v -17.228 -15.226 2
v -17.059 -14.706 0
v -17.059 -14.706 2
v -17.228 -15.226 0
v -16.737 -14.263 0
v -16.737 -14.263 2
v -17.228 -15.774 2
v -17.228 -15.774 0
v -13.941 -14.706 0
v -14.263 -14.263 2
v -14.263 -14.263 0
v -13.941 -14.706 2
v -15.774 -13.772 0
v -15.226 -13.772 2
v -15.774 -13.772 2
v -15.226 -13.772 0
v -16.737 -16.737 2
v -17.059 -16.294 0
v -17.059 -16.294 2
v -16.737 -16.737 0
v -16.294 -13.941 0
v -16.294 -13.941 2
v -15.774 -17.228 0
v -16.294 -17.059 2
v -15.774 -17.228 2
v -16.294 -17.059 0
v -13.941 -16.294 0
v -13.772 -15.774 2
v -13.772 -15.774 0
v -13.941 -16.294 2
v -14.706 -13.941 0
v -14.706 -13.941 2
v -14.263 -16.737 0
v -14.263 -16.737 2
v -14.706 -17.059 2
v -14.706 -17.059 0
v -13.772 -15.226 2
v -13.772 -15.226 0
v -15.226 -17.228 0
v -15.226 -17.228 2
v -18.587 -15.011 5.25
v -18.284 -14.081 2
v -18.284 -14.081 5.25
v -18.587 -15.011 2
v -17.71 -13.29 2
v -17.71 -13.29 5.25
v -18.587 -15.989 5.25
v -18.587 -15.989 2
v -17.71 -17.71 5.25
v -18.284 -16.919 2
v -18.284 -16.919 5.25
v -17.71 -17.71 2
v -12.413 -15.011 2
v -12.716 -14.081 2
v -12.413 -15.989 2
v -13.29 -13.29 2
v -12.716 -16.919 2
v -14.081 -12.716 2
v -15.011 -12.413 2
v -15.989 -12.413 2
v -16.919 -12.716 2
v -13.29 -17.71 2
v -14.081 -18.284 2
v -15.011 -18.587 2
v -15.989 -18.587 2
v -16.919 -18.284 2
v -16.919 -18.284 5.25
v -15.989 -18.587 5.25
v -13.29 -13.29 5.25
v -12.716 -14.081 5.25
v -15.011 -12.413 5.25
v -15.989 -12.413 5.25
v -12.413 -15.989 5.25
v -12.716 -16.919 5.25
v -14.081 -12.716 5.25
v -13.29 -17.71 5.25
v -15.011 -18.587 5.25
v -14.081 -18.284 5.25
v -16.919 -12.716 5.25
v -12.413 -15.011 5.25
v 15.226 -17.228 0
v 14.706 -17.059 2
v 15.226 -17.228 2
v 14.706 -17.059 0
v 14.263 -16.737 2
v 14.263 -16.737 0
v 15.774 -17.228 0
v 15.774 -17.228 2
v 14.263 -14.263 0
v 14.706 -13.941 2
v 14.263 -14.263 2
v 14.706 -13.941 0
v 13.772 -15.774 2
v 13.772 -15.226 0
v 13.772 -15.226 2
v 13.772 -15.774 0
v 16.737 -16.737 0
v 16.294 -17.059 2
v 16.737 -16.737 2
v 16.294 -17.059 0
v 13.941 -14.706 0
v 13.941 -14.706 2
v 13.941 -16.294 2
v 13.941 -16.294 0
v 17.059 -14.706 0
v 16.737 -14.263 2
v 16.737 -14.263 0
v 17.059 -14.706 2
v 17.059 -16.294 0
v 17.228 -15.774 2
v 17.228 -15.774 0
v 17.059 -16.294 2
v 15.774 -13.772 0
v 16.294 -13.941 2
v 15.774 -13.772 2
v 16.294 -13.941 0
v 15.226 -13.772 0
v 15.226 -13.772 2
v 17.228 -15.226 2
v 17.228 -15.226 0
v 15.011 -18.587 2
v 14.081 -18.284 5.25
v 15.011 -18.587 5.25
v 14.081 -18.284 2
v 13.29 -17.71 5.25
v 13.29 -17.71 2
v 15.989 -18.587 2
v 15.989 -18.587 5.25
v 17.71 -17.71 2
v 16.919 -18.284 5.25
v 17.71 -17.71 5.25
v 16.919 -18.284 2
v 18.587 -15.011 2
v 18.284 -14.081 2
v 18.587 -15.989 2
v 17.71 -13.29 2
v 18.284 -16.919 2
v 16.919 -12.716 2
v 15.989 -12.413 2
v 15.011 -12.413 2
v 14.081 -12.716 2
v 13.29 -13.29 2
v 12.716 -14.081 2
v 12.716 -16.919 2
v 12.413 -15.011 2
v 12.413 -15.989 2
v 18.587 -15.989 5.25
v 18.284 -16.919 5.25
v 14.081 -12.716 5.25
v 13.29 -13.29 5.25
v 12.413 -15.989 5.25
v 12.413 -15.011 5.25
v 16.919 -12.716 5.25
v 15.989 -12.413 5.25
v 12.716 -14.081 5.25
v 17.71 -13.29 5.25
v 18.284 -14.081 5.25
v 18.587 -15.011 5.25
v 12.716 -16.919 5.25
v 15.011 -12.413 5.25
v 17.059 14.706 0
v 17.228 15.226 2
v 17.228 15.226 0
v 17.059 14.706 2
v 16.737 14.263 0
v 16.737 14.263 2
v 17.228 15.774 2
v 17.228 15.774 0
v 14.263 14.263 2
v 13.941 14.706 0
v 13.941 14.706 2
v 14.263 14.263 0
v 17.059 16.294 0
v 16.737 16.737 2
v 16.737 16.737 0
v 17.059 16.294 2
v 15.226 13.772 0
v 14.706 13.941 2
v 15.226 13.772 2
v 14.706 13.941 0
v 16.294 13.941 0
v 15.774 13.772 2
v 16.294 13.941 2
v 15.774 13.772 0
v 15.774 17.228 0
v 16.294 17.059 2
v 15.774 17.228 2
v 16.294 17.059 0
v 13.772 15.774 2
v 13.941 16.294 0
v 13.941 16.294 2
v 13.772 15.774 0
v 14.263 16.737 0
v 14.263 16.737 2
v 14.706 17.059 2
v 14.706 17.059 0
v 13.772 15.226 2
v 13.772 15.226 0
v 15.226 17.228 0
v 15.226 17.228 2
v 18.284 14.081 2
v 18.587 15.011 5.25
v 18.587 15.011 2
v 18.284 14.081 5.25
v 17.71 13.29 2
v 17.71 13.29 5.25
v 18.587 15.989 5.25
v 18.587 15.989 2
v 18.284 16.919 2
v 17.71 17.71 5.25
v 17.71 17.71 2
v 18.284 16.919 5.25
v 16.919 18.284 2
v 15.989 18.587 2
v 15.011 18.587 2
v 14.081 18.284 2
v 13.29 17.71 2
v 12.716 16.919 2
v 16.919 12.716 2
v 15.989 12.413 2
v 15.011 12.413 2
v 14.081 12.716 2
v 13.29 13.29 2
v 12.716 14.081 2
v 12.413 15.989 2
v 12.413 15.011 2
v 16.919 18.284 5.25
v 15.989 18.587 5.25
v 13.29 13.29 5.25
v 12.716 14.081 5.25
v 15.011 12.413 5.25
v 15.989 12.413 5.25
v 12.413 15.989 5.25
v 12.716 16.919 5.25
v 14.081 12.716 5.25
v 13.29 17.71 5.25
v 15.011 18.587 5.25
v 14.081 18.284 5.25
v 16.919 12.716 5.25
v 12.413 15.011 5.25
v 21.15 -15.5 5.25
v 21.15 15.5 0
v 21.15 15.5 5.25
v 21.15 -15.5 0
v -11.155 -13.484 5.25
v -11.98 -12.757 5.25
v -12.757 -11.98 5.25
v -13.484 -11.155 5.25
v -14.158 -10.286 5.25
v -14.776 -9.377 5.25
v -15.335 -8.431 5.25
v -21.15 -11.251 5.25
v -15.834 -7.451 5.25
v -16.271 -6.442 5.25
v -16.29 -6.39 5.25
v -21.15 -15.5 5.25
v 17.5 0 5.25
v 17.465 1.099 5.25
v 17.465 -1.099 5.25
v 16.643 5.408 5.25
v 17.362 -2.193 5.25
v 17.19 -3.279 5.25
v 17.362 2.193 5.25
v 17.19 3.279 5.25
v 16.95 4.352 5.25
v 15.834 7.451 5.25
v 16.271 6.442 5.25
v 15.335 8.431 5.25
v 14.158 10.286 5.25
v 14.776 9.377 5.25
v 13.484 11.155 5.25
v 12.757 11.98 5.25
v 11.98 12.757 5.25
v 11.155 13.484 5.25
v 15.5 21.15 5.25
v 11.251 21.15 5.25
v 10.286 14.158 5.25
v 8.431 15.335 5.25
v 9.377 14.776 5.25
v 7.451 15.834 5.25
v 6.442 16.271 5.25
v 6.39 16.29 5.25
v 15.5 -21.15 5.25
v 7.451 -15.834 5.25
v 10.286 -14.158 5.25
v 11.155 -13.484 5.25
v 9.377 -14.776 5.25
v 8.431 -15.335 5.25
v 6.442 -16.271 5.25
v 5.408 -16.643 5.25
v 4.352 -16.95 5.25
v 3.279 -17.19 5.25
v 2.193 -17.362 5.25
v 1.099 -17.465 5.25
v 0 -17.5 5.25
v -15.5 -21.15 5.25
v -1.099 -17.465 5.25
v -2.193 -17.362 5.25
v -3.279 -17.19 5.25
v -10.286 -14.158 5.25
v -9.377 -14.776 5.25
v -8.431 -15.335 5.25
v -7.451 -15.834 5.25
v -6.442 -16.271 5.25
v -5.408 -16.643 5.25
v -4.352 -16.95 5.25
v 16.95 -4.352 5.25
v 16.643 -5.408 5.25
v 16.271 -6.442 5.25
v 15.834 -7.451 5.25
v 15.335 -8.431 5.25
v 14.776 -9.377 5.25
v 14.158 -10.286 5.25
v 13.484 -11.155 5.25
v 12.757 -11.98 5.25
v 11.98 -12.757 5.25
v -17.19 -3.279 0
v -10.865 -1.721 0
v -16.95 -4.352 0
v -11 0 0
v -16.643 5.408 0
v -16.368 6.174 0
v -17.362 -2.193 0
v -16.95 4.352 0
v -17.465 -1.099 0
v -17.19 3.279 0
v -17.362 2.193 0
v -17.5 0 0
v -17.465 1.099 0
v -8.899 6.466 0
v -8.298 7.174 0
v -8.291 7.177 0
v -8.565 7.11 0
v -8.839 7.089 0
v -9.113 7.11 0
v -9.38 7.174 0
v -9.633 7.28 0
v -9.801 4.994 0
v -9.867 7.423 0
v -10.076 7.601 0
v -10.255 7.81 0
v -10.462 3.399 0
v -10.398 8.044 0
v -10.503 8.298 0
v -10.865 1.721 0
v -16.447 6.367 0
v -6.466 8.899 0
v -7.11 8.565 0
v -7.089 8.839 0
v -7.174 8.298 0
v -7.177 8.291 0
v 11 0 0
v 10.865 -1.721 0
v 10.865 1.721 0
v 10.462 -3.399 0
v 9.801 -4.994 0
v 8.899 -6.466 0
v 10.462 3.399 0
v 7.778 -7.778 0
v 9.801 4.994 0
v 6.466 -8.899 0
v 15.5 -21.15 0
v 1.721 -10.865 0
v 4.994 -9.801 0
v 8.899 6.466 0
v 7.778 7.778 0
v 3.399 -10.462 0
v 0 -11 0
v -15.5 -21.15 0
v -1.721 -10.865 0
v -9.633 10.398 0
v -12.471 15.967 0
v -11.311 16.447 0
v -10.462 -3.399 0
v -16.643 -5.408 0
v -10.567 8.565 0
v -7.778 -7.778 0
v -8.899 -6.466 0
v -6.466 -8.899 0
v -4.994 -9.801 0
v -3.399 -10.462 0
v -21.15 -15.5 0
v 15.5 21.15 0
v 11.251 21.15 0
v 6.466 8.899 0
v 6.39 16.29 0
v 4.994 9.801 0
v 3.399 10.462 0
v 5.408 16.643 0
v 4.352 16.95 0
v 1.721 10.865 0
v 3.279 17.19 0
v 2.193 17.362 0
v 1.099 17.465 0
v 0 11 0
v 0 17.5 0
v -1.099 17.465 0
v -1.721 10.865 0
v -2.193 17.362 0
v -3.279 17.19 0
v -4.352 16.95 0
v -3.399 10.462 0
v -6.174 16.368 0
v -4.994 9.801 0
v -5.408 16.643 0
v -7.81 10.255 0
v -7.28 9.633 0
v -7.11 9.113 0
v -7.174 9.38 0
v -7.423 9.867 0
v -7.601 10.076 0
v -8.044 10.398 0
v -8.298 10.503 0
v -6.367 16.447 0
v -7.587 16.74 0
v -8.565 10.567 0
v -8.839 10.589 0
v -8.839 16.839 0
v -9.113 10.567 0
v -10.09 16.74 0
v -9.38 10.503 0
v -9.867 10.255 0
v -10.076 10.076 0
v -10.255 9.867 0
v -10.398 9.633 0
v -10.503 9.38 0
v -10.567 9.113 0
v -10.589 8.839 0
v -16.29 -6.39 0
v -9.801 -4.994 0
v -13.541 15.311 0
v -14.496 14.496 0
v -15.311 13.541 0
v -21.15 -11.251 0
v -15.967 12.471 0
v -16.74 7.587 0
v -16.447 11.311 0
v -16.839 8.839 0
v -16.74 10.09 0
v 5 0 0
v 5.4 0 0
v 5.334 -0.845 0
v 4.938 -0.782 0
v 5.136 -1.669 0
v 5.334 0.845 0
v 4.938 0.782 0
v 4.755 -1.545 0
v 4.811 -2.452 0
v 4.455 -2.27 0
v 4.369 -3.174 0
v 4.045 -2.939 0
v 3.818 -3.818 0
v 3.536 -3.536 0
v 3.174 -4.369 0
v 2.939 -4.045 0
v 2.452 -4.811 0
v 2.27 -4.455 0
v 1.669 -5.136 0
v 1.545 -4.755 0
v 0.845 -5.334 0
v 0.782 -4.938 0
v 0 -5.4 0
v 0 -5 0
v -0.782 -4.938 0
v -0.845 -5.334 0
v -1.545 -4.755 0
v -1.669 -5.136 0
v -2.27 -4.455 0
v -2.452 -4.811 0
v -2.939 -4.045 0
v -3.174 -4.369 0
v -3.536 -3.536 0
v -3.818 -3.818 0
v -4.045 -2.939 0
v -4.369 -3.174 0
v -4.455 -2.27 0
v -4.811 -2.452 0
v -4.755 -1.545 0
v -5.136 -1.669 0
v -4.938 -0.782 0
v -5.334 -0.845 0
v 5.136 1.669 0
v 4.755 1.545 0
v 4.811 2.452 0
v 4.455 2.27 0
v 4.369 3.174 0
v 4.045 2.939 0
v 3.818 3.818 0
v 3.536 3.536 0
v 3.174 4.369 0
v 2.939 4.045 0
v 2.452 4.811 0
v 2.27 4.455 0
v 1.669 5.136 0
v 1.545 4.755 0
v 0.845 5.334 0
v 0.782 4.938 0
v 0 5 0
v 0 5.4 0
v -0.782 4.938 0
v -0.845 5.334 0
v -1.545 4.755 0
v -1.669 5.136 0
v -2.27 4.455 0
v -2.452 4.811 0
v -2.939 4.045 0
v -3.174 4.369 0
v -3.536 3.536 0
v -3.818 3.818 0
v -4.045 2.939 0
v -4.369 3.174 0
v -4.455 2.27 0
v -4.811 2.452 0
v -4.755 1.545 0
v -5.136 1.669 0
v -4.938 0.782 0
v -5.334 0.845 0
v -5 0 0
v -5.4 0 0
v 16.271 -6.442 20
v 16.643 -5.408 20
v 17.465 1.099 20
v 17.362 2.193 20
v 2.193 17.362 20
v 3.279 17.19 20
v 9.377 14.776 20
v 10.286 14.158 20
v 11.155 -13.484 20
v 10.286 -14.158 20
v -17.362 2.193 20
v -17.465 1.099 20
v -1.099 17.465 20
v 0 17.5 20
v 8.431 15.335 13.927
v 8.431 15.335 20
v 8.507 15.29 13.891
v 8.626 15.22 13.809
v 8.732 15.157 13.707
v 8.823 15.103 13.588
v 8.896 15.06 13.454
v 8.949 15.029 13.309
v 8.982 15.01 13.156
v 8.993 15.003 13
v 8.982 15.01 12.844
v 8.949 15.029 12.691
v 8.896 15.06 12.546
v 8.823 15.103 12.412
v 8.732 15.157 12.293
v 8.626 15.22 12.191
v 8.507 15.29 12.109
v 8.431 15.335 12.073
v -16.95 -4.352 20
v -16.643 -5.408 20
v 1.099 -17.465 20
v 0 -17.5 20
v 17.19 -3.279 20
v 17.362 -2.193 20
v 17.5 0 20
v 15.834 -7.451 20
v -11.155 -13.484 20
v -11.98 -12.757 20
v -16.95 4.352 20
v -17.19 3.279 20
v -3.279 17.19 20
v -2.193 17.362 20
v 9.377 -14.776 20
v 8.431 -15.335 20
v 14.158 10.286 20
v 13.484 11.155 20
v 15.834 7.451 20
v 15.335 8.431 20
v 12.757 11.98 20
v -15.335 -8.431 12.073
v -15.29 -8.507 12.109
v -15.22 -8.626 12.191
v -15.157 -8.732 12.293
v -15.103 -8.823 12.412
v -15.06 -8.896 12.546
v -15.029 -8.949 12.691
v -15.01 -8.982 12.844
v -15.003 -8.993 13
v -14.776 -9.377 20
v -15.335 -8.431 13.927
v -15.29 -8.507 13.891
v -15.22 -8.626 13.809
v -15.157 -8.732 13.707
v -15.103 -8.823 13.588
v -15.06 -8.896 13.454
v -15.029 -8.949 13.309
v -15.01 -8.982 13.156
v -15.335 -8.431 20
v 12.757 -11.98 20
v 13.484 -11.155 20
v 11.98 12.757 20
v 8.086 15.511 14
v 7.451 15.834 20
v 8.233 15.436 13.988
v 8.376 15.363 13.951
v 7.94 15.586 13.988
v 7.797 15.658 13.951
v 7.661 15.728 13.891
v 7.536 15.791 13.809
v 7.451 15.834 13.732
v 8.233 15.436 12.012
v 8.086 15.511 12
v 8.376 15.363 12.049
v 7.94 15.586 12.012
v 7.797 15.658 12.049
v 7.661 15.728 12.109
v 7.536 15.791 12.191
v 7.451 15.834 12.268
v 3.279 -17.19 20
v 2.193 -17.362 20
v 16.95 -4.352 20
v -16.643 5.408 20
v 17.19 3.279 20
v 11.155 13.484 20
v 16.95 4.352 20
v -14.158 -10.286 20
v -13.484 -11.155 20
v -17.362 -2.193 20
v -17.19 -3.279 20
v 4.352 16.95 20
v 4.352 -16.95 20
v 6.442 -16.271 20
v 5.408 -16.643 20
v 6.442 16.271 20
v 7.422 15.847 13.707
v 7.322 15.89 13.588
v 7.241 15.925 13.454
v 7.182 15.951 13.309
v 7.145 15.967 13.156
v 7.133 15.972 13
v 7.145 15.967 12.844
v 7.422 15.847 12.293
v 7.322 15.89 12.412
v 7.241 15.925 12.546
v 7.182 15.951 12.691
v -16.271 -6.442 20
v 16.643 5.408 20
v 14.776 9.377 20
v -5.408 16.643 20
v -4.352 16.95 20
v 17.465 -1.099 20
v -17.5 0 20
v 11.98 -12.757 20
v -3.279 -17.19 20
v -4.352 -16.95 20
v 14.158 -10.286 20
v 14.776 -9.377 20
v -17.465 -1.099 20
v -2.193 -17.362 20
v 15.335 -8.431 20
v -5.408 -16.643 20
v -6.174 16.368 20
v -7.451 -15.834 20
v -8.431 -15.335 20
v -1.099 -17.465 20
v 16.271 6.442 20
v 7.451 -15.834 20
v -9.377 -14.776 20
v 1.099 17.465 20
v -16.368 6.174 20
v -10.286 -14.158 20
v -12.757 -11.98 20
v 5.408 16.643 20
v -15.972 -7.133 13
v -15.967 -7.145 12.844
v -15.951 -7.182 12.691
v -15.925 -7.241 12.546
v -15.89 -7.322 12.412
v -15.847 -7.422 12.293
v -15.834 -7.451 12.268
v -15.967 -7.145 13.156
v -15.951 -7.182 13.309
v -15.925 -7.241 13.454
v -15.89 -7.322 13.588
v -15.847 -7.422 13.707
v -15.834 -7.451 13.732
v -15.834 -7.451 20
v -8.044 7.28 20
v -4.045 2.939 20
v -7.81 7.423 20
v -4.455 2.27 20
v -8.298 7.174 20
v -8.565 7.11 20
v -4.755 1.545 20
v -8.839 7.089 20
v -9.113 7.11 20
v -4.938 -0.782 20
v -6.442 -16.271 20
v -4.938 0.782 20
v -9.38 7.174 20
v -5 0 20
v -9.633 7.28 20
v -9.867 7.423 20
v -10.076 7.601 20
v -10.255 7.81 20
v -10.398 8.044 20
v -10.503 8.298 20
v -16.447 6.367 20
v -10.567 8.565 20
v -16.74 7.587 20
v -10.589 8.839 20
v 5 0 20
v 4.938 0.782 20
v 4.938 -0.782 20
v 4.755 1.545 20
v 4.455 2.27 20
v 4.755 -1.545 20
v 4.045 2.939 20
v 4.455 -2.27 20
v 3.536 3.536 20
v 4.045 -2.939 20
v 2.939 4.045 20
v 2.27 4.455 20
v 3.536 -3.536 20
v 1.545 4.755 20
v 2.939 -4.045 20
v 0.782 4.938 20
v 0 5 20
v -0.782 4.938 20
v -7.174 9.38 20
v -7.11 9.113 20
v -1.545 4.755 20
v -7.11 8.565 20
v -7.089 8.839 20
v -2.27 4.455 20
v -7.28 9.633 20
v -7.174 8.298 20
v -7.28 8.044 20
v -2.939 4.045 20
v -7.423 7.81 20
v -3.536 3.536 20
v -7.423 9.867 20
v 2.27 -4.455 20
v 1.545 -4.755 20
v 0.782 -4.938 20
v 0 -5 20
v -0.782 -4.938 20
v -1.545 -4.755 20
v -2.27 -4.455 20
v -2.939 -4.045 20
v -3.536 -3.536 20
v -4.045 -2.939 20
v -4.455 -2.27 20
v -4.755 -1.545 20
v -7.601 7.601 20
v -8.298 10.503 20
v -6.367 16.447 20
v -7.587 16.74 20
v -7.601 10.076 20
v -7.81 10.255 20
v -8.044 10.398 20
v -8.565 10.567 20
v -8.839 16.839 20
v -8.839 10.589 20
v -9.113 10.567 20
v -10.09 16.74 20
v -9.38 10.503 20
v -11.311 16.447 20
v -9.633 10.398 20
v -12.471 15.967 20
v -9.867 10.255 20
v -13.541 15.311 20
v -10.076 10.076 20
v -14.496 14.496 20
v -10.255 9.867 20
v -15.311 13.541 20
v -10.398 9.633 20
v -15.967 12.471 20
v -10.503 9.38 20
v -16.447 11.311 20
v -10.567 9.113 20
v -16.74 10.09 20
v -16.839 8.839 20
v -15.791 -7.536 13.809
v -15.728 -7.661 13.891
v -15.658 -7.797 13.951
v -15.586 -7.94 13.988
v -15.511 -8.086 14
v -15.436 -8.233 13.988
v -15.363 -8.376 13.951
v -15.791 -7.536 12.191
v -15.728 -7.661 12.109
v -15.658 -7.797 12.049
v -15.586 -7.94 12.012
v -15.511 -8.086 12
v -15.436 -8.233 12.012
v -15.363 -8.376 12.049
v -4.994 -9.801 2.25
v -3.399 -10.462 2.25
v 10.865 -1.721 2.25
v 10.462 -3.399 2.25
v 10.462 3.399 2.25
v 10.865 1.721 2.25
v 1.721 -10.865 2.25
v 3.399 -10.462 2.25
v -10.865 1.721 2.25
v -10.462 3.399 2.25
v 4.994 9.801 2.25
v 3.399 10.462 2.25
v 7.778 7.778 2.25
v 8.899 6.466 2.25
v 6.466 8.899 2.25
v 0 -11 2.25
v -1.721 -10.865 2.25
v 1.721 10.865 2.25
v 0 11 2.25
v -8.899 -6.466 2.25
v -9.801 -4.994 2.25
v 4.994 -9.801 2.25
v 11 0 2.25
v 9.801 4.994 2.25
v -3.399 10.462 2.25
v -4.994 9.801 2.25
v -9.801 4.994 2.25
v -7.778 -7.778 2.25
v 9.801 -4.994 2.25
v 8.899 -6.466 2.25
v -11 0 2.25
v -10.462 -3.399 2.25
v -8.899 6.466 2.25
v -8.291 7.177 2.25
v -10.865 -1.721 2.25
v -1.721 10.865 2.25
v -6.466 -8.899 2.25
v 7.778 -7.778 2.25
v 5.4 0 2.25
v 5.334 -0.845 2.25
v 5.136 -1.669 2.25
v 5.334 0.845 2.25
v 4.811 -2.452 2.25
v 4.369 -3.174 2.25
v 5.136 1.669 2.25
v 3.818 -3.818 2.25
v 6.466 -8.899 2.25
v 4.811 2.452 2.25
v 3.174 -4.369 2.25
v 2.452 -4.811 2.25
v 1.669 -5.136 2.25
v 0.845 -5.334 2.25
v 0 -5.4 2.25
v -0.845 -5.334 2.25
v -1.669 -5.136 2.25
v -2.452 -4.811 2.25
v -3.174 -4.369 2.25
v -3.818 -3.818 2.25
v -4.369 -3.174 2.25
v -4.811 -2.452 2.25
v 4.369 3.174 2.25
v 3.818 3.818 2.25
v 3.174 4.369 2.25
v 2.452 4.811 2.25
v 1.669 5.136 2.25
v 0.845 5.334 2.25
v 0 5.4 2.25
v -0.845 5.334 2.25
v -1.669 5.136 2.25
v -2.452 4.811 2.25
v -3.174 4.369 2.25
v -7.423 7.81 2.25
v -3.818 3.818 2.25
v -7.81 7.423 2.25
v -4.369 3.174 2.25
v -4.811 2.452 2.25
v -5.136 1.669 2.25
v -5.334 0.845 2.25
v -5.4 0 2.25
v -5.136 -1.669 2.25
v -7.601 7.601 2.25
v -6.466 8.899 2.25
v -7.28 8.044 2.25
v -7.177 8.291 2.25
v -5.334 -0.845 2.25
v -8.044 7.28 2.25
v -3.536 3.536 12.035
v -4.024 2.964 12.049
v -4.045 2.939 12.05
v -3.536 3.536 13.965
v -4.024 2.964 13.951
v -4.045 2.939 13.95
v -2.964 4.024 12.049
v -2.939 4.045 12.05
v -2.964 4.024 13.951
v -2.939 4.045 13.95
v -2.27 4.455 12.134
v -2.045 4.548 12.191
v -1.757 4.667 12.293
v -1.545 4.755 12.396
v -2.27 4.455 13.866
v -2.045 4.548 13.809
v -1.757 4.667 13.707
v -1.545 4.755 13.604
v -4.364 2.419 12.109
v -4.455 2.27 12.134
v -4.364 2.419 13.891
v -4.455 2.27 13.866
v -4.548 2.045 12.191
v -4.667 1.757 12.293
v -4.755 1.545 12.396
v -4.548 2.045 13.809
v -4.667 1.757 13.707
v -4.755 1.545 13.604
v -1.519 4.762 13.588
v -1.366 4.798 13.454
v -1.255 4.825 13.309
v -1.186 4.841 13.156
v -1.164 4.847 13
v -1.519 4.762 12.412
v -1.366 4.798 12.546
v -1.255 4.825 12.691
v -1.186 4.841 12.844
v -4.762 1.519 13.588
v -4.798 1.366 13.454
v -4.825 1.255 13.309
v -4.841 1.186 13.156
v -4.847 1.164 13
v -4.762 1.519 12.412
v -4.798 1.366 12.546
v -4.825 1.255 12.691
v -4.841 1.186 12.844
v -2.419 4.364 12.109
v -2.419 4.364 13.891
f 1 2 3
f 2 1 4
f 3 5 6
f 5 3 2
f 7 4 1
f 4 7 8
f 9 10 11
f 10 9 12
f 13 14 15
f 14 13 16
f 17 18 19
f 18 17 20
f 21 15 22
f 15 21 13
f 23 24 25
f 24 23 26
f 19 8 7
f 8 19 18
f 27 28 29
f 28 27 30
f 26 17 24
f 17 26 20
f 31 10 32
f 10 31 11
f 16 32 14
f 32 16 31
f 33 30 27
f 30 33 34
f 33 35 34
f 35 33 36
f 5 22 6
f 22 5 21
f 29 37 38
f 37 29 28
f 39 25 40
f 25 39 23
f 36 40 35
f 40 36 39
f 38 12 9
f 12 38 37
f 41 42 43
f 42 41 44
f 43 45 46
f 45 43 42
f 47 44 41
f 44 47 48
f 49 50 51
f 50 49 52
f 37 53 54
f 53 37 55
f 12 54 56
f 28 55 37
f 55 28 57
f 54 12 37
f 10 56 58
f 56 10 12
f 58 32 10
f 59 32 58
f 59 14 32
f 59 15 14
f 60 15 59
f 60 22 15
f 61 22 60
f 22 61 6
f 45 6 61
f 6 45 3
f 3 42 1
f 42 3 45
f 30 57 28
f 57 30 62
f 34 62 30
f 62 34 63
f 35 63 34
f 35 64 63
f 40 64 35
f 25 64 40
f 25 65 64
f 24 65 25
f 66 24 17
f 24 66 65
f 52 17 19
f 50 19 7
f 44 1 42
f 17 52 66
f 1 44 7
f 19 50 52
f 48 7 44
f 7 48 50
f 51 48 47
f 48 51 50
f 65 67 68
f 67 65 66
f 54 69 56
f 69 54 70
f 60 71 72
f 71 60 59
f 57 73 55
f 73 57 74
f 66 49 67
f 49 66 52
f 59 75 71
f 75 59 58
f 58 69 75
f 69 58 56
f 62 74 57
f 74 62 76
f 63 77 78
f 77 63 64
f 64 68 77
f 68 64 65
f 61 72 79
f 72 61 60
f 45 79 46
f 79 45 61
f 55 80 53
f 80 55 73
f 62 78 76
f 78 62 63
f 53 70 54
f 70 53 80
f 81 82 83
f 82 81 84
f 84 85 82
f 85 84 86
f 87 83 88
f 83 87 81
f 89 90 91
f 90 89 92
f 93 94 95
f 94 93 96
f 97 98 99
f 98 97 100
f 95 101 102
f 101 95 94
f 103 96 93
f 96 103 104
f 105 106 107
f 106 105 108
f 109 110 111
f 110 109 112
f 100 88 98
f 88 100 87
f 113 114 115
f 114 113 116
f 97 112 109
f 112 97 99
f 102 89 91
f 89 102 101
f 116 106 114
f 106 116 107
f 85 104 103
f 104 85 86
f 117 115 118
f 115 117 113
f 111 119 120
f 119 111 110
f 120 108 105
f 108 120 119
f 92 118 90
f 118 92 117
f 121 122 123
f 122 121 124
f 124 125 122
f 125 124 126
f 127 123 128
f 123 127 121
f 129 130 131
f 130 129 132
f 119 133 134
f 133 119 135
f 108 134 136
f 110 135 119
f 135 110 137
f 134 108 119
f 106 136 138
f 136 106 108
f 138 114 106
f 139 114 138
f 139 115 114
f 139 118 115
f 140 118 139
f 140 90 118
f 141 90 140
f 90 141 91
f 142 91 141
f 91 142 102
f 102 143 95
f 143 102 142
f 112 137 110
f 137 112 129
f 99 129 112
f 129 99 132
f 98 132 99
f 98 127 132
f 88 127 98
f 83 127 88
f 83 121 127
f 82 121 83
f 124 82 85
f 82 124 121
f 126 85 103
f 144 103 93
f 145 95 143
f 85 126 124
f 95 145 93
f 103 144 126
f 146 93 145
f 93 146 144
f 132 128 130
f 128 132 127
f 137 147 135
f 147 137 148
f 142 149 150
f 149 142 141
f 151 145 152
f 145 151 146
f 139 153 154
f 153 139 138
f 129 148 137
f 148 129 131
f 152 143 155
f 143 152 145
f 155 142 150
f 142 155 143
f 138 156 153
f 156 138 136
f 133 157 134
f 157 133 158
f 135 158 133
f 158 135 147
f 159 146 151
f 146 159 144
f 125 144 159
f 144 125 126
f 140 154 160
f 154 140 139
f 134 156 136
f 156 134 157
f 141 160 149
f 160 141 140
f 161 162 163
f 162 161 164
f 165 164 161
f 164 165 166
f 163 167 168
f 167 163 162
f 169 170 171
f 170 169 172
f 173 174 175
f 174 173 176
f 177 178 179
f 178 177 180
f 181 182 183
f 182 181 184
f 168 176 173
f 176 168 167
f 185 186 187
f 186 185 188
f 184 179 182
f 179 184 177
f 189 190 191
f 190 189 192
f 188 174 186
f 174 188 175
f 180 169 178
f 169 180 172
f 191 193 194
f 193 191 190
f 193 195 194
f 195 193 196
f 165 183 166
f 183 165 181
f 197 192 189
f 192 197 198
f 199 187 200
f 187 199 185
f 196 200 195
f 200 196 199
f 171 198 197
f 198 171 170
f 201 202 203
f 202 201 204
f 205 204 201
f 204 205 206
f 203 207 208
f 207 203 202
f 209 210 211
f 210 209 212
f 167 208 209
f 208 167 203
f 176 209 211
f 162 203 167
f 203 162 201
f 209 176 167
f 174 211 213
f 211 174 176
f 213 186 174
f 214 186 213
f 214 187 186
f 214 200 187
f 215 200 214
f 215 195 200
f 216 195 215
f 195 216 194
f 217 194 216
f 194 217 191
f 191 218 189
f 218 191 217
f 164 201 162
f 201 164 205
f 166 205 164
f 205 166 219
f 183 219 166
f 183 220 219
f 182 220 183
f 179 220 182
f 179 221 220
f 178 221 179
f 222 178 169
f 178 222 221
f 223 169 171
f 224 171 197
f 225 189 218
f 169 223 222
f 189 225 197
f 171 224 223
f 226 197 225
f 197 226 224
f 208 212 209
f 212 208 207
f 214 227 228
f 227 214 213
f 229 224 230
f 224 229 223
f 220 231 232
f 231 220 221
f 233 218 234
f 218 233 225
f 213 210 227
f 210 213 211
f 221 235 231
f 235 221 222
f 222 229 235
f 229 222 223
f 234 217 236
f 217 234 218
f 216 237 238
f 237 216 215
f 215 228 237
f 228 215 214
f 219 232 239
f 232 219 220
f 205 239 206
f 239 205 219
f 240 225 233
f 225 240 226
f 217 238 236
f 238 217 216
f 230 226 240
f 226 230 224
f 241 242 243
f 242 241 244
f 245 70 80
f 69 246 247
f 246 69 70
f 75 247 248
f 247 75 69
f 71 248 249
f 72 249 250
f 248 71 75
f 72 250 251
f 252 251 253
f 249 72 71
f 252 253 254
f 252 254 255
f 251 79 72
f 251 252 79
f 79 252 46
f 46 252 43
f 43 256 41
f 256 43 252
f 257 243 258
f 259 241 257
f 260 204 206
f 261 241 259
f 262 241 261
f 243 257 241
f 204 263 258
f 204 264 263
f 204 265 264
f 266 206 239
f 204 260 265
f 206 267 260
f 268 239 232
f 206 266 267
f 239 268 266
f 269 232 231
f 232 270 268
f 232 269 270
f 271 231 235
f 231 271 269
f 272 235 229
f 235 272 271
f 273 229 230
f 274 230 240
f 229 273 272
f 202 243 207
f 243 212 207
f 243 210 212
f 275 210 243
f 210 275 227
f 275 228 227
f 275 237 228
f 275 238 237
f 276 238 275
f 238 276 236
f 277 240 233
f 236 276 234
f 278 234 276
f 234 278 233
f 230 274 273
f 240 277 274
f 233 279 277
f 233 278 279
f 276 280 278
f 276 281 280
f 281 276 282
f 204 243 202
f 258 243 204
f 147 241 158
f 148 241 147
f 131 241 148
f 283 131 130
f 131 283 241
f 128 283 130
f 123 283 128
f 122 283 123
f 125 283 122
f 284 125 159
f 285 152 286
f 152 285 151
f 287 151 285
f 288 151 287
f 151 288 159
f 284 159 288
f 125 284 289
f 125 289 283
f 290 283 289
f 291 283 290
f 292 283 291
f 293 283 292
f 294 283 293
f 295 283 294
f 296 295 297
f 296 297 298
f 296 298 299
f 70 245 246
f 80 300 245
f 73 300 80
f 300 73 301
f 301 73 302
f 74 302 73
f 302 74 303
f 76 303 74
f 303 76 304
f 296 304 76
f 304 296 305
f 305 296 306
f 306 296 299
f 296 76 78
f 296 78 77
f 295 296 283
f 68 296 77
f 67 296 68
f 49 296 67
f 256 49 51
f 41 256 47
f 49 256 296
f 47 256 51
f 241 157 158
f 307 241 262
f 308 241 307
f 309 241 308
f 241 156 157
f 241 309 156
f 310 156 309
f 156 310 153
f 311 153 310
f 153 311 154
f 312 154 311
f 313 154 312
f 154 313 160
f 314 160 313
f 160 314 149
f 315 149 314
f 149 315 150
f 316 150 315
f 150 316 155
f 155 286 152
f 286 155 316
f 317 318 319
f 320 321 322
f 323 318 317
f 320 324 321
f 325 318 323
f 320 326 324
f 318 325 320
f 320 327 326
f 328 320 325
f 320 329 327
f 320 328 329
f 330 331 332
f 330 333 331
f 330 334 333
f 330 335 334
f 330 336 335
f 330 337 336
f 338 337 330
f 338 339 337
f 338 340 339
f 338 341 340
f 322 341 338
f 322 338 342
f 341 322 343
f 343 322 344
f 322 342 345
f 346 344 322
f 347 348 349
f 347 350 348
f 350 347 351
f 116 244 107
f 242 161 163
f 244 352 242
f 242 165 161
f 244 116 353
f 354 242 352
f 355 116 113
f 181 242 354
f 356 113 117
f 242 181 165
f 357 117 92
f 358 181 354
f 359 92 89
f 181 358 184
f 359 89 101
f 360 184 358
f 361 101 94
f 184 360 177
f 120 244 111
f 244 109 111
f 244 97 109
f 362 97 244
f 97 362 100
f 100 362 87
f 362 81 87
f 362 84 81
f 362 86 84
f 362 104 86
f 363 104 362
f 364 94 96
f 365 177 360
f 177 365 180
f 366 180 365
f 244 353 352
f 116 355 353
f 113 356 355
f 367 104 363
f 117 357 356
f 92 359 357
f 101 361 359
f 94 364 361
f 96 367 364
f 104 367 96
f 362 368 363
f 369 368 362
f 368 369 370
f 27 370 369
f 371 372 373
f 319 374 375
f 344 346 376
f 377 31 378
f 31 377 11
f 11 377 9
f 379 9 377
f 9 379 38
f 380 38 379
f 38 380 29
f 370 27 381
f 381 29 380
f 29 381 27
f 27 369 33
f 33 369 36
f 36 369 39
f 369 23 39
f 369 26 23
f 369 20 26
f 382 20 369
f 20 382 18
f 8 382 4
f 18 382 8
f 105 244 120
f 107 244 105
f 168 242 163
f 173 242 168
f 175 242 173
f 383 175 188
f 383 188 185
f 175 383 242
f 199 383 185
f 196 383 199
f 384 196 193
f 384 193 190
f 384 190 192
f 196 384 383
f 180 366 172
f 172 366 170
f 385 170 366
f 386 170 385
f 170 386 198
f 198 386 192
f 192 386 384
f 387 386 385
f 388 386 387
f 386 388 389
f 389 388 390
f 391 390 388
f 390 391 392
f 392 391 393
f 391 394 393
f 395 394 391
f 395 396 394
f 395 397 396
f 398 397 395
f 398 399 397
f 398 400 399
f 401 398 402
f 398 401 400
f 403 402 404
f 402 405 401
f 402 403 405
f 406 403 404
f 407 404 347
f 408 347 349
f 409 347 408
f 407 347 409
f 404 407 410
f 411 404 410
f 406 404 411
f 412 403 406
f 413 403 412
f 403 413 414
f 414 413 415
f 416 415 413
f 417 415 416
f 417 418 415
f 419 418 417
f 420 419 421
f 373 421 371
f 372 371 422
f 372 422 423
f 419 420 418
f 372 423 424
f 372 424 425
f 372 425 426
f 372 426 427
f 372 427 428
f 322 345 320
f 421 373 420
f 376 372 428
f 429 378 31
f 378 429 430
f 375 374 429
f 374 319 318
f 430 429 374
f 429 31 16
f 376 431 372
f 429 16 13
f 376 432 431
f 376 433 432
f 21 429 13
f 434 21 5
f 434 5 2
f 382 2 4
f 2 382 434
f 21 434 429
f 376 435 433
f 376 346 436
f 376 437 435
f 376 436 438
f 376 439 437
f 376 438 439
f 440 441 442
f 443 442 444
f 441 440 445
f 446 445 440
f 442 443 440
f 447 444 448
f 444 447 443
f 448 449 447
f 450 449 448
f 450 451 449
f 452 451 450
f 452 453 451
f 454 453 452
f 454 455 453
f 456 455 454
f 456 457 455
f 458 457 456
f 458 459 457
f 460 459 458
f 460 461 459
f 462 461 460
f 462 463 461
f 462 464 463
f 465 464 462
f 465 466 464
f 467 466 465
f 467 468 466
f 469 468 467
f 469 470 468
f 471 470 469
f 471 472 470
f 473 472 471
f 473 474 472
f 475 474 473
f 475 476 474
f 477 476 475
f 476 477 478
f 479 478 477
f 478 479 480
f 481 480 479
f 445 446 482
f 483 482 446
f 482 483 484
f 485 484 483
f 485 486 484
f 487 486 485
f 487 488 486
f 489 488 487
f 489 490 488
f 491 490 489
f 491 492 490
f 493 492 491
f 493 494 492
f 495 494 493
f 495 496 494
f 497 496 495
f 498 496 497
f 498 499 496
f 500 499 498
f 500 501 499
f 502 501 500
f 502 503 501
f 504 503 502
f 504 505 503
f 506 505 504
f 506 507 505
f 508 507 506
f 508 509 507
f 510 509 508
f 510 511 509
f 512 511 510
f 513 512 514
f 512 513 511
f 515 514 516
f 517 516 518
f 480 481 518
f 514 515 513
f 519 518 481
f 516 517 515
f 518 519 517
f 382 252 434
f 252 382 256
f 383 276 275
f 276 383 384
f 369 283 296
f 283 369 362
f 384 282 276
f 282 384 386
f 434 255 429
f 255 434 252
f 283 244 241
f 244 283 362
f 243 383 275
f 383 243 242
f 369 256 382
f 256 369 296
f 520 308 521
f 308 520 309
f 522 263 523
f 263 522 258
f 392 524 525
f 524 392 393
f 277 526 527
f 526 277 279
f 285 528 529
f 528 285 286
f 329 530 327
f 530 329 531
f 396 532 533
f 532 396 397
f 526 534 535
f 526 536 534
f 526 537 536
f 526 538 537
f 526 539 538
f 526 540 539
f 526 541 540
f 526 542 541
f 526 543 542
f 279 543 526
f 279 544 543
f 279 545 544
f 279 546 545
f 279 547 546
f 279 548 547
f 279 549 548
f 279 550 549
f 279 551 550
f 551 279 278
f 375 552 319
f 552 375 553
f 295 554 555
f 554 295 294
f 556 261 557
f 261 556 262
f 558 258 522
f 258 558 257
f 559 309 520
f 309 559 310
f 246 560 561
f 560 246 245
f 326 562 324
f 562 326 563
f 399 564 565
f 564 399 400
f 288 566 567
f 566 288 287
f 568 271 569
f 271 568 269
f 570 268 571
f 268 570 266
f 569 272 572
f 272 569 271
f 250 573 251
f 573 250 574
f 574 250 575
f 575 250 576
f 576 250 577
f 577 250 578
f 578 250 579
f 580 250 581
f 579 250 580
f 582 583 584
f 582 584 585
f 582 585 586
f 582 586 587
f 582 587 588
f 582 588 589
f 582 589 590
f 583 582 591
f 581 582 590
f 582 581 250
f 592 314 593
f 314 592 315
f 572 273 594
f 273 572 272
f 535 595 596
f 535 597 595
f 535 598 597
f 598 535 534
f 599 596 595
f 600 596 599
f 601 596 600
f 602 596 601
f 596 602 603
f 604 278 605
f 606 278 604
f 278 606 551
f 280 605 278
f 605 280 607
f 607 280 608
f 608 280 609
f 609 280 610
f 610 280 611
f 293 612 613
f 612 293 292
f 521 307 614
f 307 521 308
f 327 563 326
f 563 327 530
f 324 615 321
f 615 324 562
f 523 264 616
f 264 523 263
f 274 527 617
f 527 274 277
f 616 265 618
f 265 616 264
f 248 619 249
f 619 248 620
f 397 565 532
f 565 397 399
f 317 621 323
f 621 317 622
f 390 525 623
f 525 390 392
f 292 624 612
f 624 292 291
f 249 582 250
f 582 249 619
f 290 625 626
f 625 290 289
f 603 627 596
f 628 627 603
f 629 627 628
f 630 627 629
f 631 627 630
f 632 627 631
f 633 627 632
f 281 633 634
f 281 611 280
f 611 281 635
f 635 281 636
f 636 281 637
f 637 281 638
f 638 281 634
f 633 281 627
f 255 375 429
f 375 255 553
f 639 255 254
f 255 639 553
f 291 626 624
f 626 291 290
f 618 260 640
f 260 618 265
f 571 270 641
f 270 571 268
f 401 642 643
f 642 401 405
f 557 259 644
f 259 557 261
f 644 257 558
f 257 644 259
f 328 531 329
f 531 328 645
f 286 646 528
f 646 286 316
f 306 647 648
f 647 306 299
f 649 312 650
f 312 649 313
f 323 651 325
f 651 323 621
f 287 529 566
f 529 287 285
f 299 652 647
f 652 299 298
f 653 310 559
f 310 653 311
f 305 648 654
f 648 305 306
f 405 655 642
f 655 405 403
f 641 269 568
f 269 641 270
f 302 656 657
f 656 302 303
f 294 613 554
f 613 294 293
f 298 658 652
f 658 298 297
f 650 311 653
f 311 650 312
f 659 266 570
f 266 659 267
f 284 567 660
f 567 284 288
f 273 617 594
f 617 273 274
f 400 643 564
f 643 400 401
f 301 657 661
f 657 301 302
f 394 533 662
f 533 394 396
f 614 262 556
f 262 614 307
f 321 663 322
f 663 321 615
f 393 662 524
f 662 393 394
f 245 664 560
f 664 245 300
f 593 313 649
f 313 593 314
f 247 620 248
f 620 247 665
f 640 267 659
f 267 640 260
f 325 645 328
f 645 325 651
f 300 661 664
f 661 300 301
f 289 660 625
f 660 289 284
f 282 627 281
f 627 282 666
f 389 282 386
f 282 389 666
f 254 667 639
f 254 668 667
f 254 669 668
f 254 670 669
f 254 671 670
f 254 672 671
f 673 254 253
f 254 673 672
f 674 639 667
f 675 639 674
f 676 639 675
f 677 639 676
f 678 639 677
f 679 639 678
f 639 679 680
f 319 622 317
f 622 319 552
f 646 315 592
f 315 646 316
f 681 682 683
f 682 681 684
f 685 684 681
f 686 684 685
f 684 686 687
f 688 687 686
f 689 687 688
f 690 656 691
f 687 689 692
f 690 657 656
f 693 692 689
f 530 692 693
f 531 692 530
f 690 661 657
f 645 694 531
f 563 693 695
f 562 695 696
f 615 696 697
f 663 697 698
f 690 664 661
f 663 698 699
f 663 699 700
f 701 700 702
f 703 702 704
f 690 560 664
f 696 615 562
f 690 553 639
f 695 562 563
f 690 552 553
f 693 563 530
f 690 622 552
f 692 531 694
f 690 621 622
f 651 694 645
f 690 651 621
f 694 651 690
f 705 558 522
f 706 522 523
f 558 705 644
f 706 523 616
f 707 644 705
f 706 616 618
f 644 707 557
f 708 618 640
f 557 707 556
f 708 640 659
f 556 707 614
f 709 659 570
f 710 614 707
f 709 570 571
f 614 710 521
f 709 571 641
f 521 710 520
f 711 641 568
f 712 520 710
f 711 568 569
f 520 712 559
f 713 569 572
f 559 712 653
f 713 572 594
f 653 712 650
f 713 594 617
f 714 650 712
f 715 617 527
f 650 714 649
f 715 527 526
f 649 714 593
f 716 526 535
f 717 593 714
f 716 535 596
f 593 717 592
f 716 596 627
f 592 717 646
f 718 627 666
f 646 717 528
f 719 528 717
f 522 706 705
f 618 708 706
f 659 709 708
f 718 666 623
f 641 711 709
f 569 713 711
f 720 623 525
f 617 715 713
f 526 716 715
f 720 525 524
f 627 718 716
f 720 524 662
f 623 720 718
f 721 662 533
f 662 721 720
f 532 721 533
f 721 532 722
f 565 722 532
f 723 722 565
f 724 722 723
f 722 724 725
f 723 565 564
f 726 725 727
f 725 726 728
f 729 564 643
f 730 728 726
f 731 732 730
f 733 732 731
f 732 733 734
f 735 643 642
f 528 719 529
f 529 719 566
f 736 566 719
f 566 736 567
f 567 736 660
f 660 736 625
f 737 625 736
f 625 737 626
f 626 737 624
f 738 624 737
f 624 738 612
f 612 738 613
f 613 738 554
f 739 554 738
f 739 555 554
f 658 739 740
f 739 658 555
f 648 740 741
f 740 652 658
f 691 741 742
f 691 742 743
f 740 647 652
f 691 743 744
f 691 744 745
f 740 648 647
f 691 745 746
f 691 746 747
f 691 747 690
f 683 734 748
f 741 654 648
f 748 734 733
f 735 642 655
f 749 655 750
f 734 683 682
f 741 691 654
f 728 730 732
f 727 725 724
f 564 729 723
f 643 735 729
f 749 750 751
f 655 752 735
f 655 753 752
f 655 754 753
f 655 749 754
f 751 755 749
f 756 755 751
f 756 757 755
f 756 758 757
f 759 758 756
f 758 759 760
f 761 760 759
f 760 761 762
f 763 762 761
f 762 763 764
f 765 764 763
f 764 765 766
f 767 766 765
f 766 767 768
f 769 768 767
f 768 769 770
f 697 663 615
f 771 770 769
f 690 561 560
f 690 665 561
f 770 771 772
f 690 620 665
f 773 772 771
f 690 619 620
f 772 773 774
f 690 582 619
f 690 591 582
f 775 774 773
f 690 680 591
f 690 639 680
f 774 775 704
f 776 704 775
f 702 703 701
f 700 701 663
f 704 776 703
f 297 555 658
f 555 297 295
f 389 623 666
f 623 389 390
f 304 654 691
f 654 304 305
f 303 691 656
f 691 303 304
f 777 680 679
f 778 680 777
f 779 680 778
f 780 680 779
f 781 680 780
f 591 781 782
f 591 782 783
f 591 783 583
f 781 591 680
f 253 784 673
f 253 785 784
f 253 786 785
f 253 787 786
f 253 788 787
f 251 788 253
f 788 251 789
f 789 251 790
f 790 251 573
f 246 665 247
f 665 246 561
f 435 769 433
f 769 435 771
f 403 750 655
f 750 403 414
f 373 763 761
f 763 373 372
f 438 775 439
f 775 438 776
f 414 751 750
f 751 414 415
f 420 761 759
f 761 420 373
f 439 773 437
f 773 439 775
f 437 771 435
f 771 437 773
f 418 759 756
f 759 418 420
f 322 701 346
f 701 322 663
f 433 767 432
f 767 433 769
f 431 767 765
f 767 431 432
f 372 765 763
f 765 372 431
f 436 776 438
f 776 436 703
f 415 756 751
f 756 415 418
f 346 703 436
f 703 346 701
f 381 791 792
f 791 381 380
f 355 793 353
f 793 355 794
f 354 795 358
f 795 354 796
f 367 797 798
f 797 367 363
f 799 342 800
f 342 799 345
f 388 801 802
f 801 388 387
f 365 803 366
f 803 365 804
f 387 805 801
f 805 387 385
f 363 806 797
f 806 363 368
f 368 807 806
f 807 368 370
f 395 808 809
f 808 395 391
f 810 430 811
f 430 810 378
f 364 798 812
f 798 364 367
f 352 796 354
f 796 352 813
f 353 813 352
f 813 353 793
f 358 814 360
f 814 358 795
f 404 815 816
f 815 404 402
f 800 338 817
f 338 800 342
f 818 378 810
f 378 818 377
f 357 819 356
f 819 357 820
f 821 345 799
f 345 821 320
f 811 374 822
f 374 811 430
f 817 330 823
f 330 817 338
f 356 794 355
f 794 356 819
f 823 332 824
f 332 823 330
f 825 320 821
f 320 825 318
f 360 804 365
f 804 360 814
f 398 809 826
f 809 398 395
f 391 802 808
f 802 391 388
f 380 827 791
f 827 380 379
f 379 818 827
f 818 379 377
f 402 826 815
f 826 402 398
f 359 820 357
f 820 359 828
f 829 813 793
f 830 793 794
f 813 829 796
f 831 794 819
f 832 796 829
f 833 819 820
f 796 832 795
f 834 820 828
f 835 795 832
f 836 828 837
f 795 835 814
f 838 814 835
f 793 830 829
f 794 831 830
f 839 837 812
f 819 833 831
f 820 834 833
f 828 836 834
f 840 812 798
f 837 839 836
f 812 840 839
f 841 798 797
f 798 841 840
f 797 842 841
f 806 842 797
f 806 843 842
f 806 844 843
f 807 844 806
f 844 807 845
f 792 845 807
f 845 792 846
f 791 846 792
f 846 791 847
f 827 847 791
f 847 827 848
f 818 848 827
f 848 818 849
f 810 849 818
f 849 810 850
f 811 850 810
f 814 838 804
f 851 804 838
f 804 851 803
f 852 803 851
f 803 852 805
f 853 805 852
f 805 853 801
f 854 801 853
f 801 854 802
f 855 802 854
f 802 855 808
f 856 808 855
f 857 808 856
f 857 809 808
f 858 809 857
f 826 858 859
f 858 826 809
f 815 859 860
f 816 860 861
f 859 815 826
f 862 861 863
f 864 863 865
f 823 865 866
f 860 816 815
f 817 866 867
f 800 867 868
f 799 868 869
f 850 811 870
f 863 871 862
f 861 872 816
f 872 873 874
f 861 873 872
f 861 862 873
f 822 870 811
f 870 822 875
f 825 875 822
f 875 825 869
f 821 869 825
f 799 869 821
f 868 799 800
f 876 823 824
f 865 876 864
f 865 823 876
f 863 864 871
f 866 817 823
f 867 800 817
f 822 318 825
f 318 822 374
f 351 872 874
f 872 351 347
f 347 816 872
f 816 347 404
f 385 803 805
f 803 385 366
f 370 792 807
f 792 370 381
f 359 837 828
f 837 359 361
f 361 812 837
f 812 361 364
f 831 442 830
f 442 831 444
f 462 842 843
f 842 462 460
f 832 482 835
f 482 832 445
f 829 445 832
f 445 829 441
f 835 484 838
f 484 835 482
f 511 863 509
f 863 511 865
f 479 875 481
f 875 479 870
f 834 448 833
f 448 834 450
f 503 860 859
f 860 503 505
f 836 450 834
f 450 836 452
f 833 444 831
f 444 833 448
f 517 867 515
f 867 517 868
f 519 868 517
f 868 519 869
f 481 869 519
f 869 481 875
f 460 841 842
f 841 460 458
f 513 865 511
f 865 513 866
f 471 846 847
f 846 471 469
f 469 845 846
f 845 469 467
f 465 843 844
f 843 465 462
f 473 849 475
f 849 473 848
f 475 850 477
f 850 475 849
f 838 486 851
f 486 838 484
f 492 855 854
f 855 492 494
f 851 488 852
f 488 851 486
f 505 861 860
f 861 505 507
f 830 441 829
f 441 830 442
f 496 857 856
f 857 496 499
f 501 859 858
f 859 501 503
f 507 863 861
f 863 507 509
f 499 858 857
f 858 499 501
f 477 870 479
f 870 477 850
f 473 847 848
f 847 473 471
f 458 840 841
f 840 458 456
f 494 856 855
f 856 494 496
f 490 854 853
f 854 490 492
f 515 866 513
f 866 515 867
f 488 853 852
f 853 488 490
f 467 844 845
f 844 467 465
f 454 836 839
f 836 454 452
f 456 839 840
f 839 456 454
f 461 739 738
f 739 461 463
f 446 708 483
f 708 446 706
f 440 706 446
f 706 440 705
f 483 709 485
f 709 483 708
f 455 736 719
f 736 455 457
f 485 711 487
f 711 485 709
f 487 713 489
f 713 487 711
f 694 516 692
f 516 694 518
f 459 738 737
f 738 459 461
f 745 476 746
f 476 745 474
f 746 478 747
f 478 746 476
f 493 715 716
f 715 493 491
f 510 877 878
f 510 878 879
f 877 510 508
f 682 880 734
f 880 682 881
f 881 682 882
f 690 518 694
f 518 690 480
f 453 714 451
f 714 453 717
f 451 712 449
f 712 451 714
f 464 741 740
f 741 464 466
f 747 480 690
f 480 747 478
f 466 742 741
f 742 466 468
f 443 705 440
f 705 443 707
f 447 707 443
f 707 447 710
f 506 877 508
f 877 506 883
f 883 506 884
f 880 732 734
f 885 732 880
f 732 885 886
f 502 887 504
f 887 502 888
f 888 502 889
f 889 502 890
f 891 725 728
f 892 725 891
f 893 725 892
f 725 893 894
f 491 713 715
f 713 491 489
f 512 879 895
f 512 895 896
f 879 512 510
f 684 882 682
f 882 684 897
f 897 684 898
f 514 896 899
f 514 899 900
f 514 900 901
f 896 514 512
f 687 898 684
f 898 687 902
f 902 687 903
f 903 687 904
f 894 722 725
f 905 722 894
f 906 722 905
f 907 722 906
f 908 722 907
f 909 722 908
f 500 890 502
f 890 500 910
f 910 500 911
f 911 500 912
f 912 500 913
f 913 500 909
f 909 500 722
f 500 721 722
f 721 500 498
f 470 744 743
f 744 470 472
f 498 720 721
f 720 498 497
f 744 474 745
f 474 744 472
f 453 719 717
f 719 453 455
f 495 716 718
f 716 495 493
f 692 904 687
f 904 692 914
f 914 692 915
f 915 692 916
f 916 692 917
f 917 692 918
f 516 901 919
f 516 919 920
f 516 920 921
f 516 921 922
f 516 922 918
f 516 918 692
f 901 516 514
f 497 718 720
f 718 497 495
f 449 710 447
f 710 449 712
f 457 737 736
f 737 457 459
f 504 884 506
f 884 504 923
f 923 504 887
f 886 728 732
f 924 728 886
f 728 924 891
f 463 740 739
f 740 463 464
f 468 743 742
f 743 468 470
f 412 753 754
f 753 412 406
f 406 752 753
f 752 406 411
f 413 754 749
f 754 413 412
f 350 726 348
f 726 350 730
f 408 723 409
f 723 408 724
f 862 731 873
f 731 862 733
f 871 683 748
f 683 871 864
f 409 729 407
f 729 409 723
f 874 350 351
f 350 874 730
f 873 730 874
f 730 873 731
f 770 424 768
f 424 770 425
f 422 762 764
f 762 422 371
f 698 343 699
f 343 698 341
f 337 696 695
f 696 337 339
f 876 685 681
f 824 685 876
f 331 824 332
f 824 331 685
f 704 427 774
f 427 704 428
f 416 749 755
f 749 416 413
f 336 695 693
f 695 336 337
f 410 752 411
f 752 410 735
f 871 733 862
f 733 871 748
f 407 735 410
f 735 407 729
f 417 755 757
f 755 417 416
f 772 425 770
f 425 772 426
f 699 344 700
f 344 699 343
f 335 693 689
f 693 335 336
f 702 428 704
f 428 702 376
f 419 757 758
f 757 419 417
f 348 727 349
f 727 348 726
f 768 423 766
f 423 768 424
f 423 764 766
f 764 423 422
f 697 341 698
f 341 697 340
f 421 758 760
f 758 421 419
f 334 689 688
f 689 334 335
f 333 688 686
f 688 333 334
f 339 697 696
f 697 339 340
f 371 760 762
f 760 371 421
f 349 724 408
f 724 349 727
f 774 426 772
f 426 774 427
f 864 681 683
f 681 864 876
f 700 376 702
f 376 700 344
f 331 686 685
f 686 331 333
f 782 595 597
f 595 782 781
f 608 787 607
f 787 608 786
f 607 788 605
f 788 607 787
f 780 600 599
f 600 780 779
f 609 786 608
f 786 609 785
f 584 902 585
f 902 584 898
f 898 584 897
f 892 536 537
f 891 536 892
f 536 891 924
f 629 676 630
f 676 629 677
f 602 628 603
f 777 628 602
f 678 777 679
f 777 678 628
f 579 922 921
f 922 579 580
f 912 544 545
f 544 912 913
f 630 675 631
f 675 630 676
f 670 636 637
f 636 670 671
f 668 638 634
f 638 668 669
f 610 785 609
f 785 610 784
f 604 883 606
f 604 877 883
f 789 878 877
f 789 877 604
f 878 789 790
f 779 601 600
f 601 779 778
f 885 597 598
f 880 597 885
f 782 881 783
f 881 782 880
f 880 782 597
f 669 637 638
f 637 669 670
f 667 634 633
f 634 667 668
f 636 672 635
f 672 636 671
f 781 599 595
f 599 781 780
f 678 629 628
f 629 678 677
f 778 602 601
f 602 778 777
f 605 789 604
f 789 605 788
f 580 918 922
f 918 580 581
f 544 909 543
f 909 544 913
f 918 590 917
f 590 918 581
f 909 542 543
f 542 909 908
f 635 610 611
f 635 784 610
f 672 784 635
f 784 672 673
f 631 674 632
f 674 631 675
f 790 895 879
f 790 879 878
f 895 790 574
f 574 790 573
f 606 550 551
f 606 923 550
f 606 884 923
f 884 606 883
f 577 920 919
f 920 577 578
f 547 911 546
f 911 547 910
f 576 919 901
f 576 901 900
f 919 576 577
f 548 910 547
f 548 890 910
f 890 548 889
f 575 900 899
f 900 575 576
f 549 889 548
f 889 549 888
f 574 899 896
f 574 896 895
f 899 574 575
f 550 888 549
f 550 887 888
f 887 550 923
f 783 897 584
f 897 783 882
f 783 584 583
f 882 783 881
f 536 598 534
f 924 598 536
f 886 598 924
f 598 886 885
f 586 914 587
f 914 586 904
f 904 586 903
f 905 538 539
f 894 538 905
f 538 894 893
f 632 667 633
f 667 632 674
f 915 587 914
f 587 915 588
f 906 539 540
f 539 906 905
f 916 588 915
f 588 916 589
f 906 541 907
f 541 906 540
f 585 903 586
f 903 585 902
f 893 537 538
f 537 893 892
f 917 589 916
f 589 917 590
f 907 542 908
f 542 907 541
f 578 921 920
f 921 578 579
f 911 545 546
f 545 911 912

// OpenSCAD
nema_17_w = 42.3;
nema_17_h = 25;
nema_17_bracket_h = 5.25;
nema_17_hole_space = 31;
nema_17_edge_offset = nema_17_w - (nema_17_w-nema_17_hole_space)/2;
nema_17_offset = 21.9203;
nema_17_lip_r = 22;
nema_17_lip_h = 2.75;

circular_housing = 35;
circ_housing_r = circular_housing/2;
circ_housing_h = 20;

gear_hob_d = 7;
gear_od = 9;
gear_housing = gear_od+1;

m3_major = 6.25;
m3_minor = 3.5;
m3_major_d = 3.25;

filament_w = .4;
$fn=40;

bearing_housing_d = 16;
bearing_offset = (bearing_housing_d+gear_od)/2;



difference(){
	union(){
		difference(){
			translate([-nema_17_w/2,-nema_17_w/2,0]) cube([nema_17_w,nema_17_w, nema_17_bracket_h]);
			rotate([0,0,45])translate([-nema_17_w,gear_hob_d,-.5])cube([nema_17_w*2,nema_17_w, nema_17_bracket_h+1]);

			translate([0,-nema_17_edge_offset,-.5])rotate([0,0,45])translate([15,-10,0])cube([20,10,nema_17_bracket_h+1]);
			mirror([0,1,0])translate([0,-nema_17_edge_offset,-.5])rotate([0,0,45])translate([15,-10,0])cube([20,10,nema_17_bracket_h+1]);
			mirror([1,0,0])translate([0,-nema_17_edge_offset,-.5])rotate([0,0,45])translate([15,-10,0])cube([20,10,nema_17_bracket_h+1]);

			for ( i = [0 : 2] )
			{
				rotate( i * 360 / 4+180-45, [0, 0, 1]){
					translate([0, nema_17_offset, -1])
					cylinder(r=m3_minor/2, h=nema_17_bracket_h+2, $fn=20);
					translate([0,nema_17_offset,nema_17_bracket_h-m3_major_d])
					cylinder(r=m3_major/2,h=m3_major_d+.5,$fn=20);
				}
			}
		}
		
		cylinder(r=circ_housing_r,h=circ_housing_h, $fn=100);
		
		rotate([0,0,45])translate([0,bearing_offset,0])cylinder(r=bearing_housing_d/2,h=circ_housing_h);
	}
translate([0,0,-.5])cylinder(r=gear_housing/2, h=circ_housing_h+1);

difference(){
translate([0,0,-.5])cylinder(r=nema_17_lip_r/2,h=nema_17_lip_h );
translate([0,0,0])cylinder(r=(gear_housing/2)+filament_w, h=circ_housing_h+1);
}

rotate([0,0,45])translate([0,bearing_offset,-.5])cylinder(r=m3_minor/2,h= circ_housing_h+1);
rotate([-45,90,0])translate([-13,bearing_offset/2-1,-20]) #cylinder(r=1,h=40);
}
